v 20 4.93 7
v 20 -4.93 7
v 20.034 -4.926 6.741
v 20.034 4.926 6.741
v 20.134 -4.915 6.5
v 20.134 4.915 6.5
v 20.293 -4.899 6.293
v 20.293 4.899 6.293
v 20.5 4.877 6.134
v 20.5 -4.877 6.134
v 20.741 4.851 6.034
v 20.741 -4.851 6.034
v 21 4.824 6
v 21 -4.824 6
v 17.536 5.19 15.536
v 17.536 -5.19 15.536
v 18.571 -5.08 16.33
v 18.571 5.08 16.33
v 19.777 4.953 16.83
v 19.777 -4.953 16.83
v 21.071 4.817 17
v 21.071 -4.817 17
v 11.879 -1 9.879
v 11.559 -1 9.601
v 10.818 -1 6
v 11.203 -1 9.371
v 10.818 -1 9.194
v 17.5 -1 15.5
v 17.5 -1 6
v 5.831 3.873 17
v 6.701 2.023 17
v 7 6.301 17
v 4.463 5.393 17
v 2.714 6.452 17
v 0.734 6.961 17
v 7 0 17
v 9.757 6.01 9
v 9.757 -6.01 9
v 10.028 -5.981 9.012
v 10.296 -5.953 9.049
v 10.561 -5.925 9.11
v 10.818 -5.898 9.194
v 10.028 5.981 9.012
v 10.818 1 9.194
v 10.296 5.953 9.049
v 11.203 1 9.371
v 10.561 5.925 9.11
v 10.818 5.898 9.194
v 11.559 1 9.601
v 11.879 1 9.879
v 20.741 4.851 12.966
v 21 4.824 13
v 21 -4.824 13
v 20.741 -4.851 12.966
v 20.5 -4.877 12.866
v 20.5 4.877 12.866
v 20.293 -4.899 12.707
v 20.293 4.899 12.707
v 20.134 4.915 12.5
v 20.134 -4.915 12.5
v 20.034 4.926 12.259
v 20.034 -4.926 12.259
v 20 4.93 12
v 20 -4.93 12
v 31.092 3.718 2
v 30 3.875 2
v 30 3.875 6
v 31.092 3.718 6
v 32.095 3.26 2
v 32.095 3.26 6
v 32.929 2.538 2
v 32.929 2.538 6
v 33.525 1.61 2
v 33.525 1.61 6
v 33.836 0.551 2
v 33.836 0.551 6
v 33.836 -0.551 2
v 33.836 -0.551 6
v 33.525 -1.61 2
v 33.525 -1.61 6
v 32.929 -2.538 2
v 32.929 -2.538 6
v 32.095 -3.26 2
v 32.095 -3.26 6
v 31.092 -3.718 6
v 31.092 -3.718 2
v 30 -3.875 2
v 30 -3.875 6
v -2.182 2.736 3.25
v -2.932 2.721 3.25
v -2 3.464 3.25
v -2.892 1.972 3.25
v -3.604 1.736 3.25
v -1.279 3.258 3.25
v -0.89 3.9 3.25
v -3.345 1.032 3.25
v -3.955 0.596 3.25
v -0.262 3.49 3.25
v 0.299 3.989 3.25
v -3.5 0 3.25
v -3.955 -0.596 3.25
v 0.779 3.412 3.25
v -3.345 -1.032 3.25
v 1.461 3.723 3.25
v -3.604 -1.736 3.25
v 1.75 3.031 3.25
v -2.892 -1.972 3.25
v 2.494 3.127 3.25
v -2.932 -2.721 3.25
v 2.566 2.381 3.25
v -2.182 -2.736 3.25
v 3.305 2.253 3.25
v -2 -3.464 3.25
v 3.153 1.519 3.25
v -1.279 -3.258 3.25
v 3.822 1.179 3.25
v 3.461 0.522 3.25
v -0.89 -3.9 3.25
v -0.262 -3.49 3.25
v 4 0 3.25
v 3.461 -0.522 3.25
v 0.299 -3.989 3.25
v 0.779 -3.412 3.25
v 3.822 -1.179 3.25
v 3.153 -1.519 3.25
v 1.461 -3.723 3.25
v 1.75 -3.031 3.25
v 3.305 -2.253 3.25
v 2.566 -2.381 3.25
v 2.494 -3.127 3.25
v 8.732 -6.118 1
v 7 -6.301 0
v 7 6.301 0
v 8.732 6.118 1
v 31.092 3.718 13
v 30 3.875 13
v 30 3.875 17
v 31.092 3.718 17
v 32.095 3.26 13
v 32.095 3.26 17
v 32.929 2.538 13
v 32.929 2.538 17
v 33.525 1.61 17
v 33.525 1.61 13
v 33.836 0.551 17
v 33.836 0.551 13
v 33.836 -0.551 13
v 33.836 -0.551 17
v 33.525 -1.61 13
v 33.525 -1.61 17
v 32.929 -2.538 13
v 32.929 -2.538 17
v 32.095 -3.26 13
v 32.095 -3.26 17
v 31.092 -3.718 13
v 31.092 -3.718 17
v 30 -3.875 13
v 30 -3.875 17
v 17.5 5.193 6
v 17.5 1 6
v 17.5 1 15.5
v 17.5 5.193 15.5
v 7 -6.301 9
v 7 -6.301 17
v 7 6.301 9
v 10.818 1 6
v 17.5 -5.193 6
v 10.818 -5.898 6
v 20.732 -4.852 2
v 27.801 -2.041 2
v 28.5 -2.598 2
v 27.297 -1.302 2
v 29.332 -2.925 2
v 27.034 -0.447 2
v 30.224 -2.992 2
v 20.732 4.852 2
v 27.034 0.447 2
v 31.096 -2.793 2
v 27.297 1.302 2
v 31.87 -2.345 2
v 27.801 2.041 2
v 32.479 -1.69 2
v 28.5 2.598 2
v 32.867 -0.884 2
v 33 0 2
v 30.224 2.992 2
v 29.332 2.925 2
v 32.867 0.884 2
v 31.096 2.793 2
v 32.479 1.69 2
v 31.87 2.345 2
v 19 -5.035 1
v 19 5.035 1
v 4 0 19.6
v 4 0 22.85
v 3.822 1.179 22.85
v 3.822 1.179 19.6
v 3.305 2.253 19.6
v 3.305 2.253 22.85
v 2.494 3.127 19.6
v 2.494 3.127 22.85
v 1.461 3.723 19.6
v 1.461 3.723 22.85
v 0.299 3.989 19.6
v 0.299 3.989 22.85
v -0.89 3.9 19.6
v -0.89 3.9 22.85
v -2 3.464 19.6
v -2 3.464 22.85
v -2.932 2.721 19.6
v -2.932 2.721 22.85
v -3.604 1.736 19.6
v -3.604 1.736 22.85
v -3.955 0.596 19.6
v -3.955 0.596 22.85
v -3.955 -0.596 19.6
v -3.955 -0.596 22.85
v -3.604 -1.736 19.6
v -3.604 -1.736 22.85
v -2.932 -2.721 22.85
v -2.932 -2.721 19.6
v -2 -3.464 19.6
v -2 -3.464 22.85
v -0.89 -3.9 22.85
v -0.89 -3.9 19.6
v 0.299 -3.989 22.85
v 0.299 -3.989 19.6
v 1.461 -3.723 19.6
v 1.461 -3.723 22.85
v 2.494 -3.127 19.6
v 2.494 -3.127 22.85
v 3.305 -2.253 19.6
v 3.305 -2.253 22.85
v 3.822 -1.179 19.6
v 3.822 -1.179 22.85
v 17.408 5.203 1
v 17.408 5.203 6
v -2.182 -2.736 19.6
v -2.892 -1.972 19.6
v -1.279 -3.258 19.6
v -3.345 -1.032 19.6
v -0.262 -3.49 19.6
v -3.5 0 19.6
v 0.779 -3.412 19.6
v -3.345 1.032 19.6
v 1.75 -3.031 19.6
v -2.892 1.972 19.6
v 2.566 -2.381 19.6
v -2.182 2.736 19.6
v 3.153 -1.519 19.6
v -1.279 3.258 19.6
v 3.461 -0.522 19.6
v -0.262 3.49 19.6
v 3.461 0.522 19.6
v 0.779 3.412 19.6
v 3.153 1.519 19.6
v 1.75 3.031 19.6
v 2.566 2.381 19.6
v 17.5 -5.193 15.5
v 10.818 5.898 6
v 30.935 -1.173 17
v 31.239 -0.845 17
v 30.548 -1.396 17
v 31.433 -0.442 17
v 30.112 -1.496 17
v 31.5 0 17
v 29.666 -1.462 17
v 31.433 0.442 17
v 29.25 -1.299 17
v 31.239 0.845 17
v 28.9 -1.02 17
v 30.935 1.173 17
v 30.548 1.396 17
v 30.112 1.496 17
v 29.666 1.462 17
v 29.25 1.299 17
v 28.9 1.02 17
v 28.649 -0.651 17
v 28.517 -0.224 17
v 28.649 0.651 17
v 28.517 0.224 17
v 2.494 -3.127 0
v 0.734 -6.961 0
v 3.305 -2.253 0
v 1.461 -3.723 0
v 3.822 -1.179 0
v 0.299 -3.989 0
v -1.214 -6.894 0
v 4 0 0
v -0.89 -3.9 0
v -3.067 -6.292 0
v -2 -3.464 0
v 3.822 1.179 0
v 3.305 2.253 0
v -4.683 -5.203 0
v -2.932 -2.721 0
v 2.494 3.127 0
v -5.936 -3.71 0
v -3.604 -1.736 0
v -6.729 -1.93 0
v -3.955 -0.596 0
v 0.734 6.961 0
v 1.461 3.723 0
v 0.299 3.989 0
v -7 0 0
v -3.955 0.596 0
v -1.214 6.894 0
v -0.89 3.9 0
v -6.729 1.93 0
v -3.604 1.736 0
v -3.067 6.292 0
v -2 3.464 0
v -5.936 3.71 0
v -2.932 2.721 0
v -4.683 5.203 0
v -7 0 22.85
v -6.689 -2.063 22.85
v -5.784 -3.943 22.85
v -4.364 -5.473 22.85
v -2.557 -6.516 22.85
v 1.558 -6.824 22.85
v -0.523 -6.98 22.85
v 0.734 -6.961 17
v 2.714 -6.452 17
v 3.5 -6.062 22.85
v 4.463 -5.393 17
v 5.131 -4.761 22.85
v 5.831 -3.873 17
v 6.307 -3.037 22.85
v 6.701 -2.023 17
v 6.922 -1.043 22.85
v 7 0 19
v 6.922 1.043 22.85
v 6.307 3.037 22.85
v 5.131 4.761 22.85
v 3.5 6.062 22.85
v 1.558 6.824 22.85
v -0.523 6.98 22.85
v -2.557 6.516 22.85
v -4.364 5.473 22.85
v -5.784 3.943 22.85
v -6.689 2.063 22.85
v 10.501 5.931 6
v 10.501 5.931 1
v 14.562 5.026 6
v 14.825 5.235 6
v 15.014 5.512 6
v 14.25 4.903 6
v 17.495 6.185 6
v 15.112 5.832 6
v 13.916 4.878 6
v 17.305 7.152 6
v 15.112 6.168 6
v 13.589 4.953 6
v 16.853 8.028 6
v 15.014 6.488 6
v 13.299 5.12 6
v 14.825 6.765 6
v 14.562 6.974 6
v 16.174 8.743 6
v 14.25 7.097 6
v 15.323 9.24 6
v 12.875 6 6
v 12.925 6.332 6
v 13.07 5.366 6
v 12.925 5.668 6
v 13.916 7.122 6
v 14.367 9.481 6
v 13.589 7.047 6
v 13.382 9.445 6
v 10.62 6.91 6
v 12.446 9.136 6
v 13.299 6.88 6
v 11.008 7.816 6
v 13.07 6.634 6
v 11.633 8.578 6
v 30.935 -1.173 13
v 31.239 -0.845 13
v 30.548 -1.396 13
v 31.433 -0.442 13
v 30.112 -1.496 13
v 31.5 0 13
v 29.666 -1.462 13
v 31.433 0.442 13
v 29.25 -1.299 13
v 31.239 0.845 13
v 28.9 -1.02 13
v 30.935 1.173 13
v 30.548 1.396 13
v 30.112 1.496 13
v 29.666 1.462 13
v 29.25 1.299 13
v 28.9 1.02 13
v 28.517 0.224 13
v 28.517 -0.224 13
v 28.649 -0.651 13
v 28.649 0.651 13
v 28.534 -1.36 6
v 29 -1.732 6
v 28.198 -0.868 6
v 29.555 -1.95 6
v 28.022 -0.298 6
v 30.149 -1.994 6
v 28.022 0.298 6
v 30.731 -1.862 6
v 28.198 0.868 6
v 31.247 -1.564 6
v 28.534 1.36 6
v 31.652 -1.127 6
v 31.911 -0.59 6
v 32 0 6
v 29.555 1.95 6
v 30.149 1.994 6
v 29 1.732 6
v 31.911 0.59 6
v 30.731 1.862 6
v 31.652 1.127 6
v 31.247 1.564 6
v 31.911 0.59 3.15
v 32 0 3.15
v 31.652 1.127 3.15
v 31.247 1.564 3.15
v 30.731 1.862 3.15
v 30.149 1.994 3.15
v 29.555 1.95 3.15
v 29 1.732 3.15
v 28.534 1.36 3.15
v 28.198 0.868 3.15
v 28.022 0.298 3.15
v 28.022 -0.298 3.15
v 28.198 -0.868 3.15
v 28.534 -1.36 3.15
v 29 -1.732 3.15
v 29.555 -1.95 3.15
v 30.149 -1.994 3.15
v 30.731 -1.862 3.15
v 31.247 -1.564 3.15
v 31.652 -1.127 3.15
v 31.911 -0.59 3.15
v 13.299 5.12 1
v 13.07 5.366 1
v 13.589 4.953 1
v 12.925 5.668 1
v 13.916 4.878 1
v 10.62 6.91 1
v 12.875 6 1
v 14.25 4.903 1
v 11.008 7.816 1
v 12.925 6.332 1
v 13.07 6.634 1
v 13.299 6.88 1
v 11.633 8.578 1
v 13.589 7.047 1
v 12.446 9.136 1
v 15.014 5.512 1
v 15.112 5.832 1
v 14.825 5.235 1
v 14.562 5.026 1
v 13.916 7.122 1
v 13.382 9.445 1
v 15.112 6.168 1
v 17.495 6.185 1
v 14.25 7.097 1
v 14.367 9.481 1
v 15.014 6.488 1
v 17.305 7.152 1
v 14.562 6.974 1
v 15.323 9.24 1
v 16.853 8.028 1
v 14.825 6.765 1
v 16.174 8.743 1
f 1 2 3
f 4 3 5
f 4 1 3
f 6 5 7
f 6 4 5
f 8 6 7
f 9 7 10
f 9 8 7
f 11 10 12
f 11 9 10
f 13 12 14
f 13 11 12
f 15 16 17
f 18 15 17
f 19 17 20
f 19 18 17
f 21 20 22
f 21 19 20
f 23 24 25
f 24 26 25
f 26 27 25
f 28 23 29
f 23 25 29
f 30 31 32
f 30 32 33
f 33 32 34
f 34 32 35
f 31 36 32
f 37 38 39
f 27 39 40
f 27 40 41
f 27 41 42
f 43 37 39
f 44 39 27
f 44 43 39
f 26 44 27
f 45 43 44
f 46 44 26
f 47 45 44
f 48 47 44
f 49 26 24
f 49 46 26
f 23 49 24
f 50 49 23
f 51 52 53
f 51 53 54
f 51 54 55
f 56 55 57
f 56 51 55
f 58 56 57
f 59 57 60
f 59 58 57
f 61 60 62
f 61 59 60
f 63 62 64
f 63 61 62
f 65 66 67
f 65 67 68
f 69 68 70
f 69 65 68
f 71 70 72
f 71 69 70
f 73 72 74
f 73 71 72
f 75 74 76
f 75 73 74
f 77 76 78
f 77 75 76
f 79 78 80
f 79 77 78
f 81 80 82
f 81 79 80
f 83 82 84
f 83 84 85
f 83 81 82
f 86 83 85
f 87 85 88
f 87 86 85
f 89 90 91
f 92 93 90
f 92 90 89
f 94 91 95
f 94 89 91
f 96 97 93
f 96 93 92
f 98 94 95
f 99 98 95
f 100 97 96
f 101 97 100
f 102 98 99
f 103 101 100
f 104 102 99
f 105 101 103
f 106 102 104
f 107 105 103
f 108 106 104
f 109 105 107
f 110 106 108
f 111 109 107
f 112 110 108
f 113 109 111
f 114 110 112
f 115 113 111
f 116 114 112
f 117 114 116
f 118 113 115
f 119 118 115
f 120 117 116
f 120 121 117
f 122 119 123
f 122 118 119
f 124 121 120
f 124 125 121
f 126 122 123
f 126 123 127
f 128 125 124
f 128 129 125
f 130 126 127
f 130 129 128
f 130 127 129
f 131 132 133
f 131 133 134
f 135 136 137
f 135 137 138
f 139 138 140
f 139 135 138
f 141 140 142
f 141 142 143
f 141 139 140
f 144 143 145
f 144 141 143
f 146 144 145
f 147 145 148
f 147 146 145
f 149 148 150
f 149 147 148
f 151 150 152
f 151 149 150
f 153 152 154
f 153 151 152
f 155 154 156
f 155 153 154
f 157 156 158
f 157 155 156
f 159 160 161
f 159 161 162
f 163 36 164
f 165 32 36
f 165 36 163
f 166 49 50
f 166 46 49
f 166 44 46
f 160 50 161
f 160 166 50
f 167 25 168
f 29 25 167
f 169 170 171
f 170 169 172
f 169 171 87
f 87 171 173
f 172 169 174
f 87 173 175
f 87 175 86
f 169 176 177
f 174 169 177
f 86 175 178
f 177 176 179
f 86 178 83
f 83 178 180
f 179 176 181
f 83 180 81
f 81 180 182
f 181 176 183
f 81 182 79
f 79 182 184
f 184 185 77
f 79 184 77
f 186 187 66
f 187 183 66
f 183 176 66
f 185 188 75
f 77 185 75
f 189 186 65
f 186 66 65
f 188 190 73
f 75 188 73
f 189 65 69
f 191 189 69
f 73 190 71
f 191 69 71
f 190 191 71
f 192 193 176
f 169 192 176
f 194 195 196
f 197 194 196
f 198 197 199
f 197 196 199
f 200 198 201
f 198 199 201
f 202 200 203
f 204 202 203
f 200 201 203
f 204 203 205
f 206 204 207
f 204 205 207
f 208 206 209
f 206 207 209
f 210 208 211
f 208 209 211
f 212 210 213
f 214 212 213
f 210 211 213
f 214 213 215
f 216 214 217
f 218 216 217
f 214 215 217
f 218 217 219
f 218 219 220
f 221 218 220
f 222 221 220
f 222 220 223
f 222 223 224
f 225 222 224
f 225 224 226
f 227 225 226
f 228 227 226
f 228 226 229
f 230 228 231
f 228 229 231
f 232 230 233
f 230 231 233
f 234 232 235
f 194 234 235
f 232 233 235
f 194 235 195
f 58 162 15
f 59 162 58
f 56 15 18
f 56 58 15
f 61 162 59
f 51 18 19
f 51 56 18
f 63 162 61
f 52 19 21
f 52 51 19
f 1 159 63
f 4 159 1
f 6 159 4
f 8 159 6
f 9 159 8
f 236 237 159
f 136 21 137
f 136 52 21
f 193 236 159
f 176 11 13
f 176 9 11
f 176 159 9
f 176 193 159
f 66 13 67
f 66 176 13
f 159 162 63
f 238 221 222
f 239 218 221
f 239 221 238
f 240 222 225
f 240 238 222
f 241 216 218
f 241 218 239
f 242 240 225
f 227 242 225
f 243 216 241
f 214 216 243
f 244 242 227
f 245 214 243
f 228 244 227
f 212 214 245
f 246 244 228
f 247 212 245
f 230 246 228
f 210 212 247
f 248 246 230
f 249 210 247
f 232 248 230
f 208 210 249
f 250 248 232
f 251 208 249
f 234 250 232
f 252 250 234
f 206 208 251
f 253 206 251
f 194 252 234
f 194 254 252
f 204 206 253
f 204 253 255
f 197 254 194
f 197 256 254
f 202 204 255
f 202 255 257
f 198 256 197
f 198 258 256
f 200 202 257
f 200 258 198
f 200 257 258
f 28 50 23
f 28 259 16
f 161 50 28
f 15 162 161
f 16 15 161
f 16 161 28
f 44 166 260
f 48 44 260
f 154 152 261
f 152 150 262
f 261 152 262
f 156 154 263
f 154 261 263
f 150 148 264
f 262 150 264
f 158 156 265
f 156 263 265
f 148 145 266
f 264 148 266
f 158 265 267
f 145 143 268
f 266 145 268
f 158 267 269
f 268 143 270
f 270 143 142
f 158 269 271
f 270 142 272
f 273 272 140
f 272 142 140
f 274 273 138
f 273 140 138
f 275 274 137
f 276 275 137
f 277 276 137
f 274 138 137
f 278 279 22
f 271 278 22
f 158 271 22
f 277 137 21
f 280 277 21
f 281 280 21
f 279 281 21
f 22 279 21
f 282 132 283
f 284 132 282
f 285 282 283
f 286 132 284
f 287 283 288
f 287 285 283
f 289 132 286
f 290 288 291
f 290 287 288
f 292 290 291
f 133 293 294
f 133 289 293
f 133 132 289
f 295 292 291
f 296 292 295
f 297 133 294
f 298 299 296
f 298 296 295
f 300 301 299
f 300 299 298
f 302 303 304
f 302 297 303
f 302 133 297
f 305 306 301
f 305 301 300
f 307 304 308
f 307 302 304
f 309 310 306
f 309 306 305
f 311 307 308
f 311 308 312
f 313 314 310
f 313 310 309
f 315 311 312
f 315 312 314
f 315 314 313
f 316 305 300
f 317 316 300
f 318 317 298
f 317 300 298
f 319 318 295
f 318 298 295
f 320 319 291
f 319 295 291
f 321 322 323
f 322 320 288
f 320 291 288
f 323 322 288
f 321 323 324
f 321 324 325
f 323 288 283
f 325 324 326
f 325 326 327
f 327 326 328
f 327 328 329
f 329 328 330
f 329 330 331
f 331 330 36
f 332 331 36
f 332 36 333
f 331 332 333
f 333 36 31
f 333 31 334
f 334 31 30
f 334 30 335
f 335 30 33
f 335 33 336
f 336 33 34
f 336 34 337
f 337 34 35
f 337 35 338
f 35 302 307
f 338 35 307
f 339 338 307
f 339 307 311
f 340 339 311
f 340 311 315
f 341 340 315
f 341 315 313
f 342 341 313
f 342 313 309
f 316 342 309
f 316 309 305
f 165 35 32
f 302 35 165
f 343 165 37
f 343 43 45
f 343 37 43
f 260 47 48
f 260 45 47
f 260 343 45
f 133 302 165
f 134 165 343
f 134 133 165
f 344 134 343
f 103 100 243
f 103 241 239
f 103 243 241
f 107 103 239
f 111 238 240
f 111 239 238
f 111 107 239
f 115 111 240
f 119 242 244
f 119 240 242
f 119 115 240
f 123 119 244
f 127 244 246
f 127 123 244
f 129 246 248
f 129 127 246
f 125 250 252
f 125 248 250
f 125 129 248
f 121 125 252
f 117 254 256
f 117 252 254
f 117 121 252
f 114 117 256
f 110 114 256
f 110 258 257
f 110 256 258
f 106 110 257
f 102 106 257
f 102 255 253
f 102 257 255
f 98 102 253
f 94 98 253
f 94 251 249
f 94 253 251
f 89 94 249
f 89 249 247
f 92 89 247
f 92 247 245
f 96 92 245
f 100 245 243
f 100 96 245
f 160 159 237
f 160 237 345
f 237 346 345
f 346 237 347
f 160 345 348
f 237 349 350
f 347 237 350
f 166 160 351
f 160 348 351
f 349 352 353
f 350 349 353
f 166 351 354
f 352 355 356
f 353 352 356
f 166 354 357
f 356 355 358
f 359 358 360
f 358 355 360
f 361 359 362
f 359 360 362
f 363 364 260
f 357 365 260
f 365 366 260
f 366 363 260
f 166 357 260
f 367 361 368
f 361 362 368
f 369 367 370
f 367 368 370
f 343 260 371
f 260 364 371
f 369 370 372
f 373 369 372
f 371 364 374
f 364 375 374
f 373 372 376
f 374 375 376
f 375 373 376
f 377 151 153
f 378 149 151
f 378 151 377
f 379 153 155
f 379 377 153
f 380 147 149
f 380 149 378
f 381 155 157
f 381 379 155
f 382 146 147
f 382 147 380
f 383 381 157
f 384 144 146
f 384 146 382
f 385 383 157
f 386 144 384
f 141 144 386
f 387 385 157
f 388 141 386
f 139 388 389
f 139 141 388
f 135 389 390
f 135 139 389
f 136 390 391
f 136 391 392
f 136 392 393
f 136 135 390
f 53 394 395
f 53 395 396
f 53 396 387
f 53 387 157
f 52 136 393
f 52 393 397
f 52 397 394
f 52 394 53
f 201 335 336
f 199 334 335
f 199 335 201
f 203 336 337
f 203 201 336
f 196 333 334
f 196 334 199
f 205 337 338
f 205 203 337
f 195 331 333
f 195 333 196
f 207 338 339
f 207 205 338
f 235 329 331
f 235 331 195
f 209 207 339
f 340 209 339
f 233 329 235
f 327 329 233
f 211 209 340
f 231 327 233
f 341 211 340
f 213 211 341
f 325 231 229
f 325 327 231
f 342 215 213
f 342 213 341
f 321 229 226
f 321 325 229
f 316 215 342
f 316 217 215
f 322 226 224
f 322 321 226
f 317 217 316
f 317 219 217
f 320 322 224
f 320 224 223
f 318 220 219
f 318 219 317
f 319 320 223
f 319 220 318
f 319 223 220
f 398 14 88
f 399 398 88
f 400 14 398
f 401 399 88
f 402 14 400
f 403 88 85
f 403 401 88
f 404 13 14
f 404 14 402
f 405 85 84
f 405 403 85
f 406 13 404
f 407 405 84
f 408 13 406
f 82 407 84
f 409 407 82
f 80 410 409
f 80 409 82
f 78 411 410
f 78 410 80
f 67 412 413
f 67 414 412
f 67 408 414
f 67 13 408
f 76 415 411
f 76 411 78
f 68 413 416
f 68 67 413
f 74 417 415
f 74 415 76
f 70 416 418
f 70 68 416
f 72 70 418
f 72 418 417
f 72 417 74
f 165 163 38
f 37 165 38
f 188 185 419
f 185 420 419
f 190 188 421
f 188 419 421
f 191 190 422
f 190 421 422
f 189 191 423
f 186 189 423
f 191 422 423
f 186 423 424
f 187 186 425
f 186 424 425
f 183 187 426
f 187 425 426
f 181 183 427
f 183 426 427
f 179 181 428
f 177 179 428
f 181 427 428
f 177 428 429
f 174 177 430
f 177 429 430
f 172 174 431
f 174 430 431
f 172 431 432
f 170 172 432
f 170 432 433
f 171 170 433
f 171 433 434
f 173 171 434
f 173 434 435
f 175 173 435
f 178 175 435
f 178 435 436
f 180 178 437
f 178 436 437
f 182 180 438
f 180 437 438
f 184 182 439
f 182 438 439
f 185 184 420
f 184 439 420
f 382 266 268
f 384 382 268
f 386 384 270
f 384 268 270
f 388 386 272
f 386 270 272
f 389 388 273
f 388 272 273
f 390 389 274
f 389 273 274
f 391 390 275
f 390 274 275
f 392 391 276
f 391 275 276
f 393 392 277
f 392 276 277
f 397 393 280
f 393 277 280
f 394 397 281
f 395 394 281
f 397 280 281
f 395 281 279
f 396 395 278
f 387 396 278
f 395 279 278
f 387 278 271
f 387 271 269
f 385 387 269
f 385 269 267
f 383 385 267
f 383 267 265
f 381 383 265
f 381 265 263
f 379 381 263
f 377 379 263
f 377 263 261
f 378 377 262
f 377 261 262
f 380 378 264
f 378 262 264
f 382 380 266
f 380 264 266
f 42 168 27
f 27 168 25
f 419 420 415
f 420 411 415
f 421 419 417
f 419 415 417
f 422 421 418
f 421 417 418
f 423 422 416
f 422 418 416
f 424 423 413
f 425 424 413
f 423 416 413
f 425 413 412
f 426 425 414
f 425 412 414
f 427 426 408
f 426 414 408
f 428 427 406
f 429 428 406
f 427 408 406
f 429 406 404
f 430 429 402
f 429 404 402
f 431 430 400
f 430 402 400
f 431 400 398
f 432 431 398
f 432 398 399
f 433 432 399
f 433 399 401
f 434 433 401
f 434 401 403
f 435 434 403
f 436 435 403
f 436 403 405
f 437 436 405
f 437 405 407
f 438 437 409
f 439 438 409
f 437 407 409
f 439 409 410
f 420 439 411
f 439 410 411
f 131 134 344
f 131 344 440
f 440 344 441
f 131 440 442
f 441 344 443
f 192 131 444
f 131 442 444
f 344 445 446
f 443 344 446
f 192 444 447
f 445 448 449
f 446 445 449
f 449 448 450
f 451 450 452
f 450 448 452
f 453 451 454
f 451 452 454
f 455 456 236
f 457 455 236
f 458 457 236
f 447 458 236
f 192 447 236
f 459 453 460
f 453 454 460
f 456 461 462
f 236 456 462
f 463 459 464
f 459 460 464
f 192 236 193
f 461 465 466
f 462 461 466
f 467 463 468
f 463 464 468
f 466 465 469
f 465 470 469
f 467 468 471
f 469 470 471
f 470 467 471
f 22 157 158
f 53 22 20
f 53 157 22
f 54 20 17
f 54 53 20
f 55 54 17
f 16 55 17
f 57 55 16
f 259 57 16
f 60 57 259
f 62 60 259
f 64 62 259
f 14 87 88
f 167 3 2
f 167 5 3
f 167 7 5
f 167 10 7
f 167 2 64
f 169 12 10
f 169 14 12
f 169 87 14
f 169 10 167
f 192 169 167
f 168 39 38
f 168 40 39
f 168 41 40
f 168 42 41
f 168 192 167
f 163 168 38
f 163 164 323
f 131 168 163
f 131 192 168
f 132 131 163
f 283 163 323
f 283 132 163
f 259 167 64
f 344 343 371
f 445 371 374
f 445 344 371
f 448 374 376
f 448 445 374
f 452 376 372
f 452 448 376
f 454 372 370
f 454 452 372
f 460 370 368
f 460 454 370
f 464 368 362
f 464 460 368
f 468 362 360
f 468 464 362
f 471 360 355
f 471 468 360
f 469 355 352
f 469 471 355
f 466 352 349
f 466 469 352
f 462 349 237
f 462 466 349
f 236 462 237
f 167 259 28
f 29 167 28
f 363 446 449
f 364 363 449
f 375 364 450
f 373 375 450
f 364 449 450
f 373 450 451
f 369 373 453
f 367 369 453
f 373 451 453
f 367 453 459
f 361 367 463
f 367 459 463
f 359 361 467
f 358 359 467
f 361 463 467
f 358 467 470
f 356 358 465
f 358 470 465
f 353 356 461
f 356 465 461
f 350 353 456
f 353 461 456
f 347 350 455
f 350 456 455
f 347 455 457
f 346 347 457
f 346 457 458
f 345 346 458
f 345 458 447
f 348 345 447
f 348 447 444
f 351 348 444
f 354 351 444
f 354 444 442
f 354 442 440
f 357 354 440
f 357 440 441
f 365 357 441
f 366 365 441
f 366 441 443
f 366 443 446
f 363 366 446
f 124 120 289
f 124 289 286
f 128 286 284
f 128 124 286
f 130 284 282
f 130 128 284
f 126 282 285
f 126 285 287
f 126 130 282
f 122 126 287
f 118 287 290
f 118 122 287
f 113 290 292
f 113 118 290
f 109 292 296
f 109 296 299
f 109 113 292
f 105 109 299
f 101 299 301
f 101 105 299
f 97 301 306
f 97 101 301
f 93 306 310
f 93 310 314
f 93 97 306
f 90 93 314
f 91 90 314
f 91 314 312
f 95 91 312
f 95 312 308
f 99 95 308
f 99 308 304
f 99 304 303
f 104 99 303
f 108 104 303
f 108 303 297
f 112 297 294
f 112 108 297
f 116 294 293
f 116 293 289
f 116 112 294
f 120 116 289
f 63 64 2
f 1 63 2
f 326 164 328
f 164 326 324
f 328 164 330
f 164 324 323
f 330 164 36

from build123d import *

# Parameters (mm, degrees)
SKETCH1_R                = 7
SKETCH1_R_2              = 3.5
CYLINDER_DEPTH           = 22.85
SKETCH2_R                = 4
BORE_1_DEPTH             = 3.25
BORE_START               = -3.25
SKETCH3_R                = 4
BORE_2_DEPTH             = 3.25
ARM_DEPTH                = 17
SKETCH5_R                = 3.5
OUTER_HOLE_SURFACE_DEPTH = 6
SKETCH6_R                = 1.125
OUTER_HOLE_DEPTH         = 6
SIDE_FEATURES_DEPTH      = 22
RIB_START                = -11
SKETCH10_W               = 6.681980515
SKETCH10_H               = 4.897943925
RIB_DEPTH                = 9.5
SKETCH13_R               = 1.5
BOTTOM_HOLE_DEPTH        = 4


# Read off the part's stored shape, not the designer's step: Top Counter-sunk
with BuildPart() as part:
    # Sketch1 → Cylinder (new body)
    with BuildSketch(Plane.XY):
        with Locations(Location((0, 0, 0), (0, 0, 180))):
            Circle(SKETCH1_R)
        with Locations(Location((0, 0, 0), (0, 0, 180))):
            Circle(SKETCH1_R_2, mode=Mode.SUBTRACT)
    extrude(amount=CYLINDER_DEPTH)

    # Sketch2 → Bore 1 (cut)
    with BuildSketch(Plane.XY.offset(22.85)):
        Circle(SKETCH2_R)
    extrude(amount=-BORE_1_DEPTH, mode=Mode.SUBTRACT)

    # Sketch3 → Bore 2 (cut)
    with BuildSketch(Plane(origin=(0, 0, 0), x_dir=(-1, 0, 0), z_dir=(0, 0, -1)).offset(BORE_START)):
        with Locations(Location((0, 0, 0), (0, 0, 180))):
            Circle(SKETCH3_R)
    extrude(amount=BORE_2_DEPTH, mode=Mode.SUBTRACT)

    # Sketch4 → Arm (add)
    with BuildSketch(Plane.XY):
        with BuildLine():
            Line((0.734153157, 6.961394914), (30, 3.875))
            ThreePointArc((30, 3.875), (33.875, 0), (30, -3.875))
            Line((30, -3.875), (0.734153157, -6.961394914))
            ThreePointArc((0.734153157, -6.961394914), (7, 0), (0.734153157, 6.961394914))
        make_face()
    extrude(amount=ARM_DEPTH)

    # Sketch5 → Outer Hole surface (add)
    with BuildSketch(Plane(origin=(0, 0, 0), x_dir=(-1, 0, 0), z_dir=(0, 0, -1))):
        with Locations((-14, 6)):
            Circle(SKETCH5_R)
    extrude(amount=-OUTER_HOLE_SURFACE_DEPTH)

    # Sketch6 → Outer hole (cut)
    with BuildSketch(Plane(origin=(0, 0, 0), x_dir=(-1, 0, 0), z_dir=(0, 0, -1))):
        with Locations((-14, 6)):
            Circle(SKETCH6_R)
    extrude(amount=-OUTER_HOLE_DEPTH, mode=Mode.SUBTRACT)

    # Sketch8 → side Features (cut)
    with BuildSketch(Plane(origin=(0, 10, 0), x_dir=(1, 0, 0), z_dir=(0, 1, 0))):
        with BuildLine():
            Line((21, -6), (40, -6))
            Line((40, -6), (40, -13))
            Line((40, -13), (21, -13))
            ThreePointArc((21, -13), (20.292893219, -12.707106781), (20, -12))
            Line((20, -12), (20, -7))
            ThreePointArc((20, -7), (20.292893219, -6.292893219), (21, -6))
        make_face()
        with BuildLine():
            Line((7, -19), (7, -9))
            Line((7, -9), (9.757359313, -9))
            ThreePointArc((9.757359313, -9), (10.90540961, -9.228361402), (11.878679656, -9.878679656))
            Line((11.878679656, -9.878679656), (17.535533906, -15.535533906))
            ThreePointArc((17.535533906, -15.535533906), (19.15765065, -16.619397663), (21.071067812, -17))
            Line((21.071067812, -17), (27, -17))
            Line((27, -17), (27, -19))
            Line((27, -19), (7, -19))
        make_face()
        Polygon((7, 0), (8.732050808, -1), (19, -1), (20.732050808, -2), (40, -2), (40, 0), align=None)
    extrude(amount=-SIDE_FEATURES_DEPTH, mode=Mode.SUBTRACT)

    # Sketch10 → Rib (cut)
    with BuildSketch(Plane.XY.offset(17).offset(RIB_START)):
        with Locations((14.159009743, 3.448971963)):
            Rectangle(SKETCH10_W, SKETCH10_H)
        with Locations((14.159009743, -3.448971963)):
            Rectangle(SKETCH10_W, SKETCH10_H)
    extrude(amount=RIB_DEPTH, mode=Mode.SUBTRACT)

    # Top Counter-sunk outline → Top Counter-sunk (revolve, cut)
    with BuildSketch(Plane(origin=(30, 0, 0), x_dir=(1, 0, 0), z_dir=(0, -1, 0))):
        Polygon((2, 3.150368407), (2, 6), (0, 6), (0, 2), (3, 2), align=None)
    revolve(axis=Axis((30, 0, 0), (0, 0, 1)), mode=Mode.SUBTRACT)

    # Sketch13 → Bottom hole (cut)
    with BuildSketch(Plane.XY.offset(17)):
        with Locations((30, 0)):
            Circle(SKETCH13_R)
    extrude(amount=-BOTTOM_HOLE_DEPTH, mode=Mode.SUBTRACT)


solid = part.part
